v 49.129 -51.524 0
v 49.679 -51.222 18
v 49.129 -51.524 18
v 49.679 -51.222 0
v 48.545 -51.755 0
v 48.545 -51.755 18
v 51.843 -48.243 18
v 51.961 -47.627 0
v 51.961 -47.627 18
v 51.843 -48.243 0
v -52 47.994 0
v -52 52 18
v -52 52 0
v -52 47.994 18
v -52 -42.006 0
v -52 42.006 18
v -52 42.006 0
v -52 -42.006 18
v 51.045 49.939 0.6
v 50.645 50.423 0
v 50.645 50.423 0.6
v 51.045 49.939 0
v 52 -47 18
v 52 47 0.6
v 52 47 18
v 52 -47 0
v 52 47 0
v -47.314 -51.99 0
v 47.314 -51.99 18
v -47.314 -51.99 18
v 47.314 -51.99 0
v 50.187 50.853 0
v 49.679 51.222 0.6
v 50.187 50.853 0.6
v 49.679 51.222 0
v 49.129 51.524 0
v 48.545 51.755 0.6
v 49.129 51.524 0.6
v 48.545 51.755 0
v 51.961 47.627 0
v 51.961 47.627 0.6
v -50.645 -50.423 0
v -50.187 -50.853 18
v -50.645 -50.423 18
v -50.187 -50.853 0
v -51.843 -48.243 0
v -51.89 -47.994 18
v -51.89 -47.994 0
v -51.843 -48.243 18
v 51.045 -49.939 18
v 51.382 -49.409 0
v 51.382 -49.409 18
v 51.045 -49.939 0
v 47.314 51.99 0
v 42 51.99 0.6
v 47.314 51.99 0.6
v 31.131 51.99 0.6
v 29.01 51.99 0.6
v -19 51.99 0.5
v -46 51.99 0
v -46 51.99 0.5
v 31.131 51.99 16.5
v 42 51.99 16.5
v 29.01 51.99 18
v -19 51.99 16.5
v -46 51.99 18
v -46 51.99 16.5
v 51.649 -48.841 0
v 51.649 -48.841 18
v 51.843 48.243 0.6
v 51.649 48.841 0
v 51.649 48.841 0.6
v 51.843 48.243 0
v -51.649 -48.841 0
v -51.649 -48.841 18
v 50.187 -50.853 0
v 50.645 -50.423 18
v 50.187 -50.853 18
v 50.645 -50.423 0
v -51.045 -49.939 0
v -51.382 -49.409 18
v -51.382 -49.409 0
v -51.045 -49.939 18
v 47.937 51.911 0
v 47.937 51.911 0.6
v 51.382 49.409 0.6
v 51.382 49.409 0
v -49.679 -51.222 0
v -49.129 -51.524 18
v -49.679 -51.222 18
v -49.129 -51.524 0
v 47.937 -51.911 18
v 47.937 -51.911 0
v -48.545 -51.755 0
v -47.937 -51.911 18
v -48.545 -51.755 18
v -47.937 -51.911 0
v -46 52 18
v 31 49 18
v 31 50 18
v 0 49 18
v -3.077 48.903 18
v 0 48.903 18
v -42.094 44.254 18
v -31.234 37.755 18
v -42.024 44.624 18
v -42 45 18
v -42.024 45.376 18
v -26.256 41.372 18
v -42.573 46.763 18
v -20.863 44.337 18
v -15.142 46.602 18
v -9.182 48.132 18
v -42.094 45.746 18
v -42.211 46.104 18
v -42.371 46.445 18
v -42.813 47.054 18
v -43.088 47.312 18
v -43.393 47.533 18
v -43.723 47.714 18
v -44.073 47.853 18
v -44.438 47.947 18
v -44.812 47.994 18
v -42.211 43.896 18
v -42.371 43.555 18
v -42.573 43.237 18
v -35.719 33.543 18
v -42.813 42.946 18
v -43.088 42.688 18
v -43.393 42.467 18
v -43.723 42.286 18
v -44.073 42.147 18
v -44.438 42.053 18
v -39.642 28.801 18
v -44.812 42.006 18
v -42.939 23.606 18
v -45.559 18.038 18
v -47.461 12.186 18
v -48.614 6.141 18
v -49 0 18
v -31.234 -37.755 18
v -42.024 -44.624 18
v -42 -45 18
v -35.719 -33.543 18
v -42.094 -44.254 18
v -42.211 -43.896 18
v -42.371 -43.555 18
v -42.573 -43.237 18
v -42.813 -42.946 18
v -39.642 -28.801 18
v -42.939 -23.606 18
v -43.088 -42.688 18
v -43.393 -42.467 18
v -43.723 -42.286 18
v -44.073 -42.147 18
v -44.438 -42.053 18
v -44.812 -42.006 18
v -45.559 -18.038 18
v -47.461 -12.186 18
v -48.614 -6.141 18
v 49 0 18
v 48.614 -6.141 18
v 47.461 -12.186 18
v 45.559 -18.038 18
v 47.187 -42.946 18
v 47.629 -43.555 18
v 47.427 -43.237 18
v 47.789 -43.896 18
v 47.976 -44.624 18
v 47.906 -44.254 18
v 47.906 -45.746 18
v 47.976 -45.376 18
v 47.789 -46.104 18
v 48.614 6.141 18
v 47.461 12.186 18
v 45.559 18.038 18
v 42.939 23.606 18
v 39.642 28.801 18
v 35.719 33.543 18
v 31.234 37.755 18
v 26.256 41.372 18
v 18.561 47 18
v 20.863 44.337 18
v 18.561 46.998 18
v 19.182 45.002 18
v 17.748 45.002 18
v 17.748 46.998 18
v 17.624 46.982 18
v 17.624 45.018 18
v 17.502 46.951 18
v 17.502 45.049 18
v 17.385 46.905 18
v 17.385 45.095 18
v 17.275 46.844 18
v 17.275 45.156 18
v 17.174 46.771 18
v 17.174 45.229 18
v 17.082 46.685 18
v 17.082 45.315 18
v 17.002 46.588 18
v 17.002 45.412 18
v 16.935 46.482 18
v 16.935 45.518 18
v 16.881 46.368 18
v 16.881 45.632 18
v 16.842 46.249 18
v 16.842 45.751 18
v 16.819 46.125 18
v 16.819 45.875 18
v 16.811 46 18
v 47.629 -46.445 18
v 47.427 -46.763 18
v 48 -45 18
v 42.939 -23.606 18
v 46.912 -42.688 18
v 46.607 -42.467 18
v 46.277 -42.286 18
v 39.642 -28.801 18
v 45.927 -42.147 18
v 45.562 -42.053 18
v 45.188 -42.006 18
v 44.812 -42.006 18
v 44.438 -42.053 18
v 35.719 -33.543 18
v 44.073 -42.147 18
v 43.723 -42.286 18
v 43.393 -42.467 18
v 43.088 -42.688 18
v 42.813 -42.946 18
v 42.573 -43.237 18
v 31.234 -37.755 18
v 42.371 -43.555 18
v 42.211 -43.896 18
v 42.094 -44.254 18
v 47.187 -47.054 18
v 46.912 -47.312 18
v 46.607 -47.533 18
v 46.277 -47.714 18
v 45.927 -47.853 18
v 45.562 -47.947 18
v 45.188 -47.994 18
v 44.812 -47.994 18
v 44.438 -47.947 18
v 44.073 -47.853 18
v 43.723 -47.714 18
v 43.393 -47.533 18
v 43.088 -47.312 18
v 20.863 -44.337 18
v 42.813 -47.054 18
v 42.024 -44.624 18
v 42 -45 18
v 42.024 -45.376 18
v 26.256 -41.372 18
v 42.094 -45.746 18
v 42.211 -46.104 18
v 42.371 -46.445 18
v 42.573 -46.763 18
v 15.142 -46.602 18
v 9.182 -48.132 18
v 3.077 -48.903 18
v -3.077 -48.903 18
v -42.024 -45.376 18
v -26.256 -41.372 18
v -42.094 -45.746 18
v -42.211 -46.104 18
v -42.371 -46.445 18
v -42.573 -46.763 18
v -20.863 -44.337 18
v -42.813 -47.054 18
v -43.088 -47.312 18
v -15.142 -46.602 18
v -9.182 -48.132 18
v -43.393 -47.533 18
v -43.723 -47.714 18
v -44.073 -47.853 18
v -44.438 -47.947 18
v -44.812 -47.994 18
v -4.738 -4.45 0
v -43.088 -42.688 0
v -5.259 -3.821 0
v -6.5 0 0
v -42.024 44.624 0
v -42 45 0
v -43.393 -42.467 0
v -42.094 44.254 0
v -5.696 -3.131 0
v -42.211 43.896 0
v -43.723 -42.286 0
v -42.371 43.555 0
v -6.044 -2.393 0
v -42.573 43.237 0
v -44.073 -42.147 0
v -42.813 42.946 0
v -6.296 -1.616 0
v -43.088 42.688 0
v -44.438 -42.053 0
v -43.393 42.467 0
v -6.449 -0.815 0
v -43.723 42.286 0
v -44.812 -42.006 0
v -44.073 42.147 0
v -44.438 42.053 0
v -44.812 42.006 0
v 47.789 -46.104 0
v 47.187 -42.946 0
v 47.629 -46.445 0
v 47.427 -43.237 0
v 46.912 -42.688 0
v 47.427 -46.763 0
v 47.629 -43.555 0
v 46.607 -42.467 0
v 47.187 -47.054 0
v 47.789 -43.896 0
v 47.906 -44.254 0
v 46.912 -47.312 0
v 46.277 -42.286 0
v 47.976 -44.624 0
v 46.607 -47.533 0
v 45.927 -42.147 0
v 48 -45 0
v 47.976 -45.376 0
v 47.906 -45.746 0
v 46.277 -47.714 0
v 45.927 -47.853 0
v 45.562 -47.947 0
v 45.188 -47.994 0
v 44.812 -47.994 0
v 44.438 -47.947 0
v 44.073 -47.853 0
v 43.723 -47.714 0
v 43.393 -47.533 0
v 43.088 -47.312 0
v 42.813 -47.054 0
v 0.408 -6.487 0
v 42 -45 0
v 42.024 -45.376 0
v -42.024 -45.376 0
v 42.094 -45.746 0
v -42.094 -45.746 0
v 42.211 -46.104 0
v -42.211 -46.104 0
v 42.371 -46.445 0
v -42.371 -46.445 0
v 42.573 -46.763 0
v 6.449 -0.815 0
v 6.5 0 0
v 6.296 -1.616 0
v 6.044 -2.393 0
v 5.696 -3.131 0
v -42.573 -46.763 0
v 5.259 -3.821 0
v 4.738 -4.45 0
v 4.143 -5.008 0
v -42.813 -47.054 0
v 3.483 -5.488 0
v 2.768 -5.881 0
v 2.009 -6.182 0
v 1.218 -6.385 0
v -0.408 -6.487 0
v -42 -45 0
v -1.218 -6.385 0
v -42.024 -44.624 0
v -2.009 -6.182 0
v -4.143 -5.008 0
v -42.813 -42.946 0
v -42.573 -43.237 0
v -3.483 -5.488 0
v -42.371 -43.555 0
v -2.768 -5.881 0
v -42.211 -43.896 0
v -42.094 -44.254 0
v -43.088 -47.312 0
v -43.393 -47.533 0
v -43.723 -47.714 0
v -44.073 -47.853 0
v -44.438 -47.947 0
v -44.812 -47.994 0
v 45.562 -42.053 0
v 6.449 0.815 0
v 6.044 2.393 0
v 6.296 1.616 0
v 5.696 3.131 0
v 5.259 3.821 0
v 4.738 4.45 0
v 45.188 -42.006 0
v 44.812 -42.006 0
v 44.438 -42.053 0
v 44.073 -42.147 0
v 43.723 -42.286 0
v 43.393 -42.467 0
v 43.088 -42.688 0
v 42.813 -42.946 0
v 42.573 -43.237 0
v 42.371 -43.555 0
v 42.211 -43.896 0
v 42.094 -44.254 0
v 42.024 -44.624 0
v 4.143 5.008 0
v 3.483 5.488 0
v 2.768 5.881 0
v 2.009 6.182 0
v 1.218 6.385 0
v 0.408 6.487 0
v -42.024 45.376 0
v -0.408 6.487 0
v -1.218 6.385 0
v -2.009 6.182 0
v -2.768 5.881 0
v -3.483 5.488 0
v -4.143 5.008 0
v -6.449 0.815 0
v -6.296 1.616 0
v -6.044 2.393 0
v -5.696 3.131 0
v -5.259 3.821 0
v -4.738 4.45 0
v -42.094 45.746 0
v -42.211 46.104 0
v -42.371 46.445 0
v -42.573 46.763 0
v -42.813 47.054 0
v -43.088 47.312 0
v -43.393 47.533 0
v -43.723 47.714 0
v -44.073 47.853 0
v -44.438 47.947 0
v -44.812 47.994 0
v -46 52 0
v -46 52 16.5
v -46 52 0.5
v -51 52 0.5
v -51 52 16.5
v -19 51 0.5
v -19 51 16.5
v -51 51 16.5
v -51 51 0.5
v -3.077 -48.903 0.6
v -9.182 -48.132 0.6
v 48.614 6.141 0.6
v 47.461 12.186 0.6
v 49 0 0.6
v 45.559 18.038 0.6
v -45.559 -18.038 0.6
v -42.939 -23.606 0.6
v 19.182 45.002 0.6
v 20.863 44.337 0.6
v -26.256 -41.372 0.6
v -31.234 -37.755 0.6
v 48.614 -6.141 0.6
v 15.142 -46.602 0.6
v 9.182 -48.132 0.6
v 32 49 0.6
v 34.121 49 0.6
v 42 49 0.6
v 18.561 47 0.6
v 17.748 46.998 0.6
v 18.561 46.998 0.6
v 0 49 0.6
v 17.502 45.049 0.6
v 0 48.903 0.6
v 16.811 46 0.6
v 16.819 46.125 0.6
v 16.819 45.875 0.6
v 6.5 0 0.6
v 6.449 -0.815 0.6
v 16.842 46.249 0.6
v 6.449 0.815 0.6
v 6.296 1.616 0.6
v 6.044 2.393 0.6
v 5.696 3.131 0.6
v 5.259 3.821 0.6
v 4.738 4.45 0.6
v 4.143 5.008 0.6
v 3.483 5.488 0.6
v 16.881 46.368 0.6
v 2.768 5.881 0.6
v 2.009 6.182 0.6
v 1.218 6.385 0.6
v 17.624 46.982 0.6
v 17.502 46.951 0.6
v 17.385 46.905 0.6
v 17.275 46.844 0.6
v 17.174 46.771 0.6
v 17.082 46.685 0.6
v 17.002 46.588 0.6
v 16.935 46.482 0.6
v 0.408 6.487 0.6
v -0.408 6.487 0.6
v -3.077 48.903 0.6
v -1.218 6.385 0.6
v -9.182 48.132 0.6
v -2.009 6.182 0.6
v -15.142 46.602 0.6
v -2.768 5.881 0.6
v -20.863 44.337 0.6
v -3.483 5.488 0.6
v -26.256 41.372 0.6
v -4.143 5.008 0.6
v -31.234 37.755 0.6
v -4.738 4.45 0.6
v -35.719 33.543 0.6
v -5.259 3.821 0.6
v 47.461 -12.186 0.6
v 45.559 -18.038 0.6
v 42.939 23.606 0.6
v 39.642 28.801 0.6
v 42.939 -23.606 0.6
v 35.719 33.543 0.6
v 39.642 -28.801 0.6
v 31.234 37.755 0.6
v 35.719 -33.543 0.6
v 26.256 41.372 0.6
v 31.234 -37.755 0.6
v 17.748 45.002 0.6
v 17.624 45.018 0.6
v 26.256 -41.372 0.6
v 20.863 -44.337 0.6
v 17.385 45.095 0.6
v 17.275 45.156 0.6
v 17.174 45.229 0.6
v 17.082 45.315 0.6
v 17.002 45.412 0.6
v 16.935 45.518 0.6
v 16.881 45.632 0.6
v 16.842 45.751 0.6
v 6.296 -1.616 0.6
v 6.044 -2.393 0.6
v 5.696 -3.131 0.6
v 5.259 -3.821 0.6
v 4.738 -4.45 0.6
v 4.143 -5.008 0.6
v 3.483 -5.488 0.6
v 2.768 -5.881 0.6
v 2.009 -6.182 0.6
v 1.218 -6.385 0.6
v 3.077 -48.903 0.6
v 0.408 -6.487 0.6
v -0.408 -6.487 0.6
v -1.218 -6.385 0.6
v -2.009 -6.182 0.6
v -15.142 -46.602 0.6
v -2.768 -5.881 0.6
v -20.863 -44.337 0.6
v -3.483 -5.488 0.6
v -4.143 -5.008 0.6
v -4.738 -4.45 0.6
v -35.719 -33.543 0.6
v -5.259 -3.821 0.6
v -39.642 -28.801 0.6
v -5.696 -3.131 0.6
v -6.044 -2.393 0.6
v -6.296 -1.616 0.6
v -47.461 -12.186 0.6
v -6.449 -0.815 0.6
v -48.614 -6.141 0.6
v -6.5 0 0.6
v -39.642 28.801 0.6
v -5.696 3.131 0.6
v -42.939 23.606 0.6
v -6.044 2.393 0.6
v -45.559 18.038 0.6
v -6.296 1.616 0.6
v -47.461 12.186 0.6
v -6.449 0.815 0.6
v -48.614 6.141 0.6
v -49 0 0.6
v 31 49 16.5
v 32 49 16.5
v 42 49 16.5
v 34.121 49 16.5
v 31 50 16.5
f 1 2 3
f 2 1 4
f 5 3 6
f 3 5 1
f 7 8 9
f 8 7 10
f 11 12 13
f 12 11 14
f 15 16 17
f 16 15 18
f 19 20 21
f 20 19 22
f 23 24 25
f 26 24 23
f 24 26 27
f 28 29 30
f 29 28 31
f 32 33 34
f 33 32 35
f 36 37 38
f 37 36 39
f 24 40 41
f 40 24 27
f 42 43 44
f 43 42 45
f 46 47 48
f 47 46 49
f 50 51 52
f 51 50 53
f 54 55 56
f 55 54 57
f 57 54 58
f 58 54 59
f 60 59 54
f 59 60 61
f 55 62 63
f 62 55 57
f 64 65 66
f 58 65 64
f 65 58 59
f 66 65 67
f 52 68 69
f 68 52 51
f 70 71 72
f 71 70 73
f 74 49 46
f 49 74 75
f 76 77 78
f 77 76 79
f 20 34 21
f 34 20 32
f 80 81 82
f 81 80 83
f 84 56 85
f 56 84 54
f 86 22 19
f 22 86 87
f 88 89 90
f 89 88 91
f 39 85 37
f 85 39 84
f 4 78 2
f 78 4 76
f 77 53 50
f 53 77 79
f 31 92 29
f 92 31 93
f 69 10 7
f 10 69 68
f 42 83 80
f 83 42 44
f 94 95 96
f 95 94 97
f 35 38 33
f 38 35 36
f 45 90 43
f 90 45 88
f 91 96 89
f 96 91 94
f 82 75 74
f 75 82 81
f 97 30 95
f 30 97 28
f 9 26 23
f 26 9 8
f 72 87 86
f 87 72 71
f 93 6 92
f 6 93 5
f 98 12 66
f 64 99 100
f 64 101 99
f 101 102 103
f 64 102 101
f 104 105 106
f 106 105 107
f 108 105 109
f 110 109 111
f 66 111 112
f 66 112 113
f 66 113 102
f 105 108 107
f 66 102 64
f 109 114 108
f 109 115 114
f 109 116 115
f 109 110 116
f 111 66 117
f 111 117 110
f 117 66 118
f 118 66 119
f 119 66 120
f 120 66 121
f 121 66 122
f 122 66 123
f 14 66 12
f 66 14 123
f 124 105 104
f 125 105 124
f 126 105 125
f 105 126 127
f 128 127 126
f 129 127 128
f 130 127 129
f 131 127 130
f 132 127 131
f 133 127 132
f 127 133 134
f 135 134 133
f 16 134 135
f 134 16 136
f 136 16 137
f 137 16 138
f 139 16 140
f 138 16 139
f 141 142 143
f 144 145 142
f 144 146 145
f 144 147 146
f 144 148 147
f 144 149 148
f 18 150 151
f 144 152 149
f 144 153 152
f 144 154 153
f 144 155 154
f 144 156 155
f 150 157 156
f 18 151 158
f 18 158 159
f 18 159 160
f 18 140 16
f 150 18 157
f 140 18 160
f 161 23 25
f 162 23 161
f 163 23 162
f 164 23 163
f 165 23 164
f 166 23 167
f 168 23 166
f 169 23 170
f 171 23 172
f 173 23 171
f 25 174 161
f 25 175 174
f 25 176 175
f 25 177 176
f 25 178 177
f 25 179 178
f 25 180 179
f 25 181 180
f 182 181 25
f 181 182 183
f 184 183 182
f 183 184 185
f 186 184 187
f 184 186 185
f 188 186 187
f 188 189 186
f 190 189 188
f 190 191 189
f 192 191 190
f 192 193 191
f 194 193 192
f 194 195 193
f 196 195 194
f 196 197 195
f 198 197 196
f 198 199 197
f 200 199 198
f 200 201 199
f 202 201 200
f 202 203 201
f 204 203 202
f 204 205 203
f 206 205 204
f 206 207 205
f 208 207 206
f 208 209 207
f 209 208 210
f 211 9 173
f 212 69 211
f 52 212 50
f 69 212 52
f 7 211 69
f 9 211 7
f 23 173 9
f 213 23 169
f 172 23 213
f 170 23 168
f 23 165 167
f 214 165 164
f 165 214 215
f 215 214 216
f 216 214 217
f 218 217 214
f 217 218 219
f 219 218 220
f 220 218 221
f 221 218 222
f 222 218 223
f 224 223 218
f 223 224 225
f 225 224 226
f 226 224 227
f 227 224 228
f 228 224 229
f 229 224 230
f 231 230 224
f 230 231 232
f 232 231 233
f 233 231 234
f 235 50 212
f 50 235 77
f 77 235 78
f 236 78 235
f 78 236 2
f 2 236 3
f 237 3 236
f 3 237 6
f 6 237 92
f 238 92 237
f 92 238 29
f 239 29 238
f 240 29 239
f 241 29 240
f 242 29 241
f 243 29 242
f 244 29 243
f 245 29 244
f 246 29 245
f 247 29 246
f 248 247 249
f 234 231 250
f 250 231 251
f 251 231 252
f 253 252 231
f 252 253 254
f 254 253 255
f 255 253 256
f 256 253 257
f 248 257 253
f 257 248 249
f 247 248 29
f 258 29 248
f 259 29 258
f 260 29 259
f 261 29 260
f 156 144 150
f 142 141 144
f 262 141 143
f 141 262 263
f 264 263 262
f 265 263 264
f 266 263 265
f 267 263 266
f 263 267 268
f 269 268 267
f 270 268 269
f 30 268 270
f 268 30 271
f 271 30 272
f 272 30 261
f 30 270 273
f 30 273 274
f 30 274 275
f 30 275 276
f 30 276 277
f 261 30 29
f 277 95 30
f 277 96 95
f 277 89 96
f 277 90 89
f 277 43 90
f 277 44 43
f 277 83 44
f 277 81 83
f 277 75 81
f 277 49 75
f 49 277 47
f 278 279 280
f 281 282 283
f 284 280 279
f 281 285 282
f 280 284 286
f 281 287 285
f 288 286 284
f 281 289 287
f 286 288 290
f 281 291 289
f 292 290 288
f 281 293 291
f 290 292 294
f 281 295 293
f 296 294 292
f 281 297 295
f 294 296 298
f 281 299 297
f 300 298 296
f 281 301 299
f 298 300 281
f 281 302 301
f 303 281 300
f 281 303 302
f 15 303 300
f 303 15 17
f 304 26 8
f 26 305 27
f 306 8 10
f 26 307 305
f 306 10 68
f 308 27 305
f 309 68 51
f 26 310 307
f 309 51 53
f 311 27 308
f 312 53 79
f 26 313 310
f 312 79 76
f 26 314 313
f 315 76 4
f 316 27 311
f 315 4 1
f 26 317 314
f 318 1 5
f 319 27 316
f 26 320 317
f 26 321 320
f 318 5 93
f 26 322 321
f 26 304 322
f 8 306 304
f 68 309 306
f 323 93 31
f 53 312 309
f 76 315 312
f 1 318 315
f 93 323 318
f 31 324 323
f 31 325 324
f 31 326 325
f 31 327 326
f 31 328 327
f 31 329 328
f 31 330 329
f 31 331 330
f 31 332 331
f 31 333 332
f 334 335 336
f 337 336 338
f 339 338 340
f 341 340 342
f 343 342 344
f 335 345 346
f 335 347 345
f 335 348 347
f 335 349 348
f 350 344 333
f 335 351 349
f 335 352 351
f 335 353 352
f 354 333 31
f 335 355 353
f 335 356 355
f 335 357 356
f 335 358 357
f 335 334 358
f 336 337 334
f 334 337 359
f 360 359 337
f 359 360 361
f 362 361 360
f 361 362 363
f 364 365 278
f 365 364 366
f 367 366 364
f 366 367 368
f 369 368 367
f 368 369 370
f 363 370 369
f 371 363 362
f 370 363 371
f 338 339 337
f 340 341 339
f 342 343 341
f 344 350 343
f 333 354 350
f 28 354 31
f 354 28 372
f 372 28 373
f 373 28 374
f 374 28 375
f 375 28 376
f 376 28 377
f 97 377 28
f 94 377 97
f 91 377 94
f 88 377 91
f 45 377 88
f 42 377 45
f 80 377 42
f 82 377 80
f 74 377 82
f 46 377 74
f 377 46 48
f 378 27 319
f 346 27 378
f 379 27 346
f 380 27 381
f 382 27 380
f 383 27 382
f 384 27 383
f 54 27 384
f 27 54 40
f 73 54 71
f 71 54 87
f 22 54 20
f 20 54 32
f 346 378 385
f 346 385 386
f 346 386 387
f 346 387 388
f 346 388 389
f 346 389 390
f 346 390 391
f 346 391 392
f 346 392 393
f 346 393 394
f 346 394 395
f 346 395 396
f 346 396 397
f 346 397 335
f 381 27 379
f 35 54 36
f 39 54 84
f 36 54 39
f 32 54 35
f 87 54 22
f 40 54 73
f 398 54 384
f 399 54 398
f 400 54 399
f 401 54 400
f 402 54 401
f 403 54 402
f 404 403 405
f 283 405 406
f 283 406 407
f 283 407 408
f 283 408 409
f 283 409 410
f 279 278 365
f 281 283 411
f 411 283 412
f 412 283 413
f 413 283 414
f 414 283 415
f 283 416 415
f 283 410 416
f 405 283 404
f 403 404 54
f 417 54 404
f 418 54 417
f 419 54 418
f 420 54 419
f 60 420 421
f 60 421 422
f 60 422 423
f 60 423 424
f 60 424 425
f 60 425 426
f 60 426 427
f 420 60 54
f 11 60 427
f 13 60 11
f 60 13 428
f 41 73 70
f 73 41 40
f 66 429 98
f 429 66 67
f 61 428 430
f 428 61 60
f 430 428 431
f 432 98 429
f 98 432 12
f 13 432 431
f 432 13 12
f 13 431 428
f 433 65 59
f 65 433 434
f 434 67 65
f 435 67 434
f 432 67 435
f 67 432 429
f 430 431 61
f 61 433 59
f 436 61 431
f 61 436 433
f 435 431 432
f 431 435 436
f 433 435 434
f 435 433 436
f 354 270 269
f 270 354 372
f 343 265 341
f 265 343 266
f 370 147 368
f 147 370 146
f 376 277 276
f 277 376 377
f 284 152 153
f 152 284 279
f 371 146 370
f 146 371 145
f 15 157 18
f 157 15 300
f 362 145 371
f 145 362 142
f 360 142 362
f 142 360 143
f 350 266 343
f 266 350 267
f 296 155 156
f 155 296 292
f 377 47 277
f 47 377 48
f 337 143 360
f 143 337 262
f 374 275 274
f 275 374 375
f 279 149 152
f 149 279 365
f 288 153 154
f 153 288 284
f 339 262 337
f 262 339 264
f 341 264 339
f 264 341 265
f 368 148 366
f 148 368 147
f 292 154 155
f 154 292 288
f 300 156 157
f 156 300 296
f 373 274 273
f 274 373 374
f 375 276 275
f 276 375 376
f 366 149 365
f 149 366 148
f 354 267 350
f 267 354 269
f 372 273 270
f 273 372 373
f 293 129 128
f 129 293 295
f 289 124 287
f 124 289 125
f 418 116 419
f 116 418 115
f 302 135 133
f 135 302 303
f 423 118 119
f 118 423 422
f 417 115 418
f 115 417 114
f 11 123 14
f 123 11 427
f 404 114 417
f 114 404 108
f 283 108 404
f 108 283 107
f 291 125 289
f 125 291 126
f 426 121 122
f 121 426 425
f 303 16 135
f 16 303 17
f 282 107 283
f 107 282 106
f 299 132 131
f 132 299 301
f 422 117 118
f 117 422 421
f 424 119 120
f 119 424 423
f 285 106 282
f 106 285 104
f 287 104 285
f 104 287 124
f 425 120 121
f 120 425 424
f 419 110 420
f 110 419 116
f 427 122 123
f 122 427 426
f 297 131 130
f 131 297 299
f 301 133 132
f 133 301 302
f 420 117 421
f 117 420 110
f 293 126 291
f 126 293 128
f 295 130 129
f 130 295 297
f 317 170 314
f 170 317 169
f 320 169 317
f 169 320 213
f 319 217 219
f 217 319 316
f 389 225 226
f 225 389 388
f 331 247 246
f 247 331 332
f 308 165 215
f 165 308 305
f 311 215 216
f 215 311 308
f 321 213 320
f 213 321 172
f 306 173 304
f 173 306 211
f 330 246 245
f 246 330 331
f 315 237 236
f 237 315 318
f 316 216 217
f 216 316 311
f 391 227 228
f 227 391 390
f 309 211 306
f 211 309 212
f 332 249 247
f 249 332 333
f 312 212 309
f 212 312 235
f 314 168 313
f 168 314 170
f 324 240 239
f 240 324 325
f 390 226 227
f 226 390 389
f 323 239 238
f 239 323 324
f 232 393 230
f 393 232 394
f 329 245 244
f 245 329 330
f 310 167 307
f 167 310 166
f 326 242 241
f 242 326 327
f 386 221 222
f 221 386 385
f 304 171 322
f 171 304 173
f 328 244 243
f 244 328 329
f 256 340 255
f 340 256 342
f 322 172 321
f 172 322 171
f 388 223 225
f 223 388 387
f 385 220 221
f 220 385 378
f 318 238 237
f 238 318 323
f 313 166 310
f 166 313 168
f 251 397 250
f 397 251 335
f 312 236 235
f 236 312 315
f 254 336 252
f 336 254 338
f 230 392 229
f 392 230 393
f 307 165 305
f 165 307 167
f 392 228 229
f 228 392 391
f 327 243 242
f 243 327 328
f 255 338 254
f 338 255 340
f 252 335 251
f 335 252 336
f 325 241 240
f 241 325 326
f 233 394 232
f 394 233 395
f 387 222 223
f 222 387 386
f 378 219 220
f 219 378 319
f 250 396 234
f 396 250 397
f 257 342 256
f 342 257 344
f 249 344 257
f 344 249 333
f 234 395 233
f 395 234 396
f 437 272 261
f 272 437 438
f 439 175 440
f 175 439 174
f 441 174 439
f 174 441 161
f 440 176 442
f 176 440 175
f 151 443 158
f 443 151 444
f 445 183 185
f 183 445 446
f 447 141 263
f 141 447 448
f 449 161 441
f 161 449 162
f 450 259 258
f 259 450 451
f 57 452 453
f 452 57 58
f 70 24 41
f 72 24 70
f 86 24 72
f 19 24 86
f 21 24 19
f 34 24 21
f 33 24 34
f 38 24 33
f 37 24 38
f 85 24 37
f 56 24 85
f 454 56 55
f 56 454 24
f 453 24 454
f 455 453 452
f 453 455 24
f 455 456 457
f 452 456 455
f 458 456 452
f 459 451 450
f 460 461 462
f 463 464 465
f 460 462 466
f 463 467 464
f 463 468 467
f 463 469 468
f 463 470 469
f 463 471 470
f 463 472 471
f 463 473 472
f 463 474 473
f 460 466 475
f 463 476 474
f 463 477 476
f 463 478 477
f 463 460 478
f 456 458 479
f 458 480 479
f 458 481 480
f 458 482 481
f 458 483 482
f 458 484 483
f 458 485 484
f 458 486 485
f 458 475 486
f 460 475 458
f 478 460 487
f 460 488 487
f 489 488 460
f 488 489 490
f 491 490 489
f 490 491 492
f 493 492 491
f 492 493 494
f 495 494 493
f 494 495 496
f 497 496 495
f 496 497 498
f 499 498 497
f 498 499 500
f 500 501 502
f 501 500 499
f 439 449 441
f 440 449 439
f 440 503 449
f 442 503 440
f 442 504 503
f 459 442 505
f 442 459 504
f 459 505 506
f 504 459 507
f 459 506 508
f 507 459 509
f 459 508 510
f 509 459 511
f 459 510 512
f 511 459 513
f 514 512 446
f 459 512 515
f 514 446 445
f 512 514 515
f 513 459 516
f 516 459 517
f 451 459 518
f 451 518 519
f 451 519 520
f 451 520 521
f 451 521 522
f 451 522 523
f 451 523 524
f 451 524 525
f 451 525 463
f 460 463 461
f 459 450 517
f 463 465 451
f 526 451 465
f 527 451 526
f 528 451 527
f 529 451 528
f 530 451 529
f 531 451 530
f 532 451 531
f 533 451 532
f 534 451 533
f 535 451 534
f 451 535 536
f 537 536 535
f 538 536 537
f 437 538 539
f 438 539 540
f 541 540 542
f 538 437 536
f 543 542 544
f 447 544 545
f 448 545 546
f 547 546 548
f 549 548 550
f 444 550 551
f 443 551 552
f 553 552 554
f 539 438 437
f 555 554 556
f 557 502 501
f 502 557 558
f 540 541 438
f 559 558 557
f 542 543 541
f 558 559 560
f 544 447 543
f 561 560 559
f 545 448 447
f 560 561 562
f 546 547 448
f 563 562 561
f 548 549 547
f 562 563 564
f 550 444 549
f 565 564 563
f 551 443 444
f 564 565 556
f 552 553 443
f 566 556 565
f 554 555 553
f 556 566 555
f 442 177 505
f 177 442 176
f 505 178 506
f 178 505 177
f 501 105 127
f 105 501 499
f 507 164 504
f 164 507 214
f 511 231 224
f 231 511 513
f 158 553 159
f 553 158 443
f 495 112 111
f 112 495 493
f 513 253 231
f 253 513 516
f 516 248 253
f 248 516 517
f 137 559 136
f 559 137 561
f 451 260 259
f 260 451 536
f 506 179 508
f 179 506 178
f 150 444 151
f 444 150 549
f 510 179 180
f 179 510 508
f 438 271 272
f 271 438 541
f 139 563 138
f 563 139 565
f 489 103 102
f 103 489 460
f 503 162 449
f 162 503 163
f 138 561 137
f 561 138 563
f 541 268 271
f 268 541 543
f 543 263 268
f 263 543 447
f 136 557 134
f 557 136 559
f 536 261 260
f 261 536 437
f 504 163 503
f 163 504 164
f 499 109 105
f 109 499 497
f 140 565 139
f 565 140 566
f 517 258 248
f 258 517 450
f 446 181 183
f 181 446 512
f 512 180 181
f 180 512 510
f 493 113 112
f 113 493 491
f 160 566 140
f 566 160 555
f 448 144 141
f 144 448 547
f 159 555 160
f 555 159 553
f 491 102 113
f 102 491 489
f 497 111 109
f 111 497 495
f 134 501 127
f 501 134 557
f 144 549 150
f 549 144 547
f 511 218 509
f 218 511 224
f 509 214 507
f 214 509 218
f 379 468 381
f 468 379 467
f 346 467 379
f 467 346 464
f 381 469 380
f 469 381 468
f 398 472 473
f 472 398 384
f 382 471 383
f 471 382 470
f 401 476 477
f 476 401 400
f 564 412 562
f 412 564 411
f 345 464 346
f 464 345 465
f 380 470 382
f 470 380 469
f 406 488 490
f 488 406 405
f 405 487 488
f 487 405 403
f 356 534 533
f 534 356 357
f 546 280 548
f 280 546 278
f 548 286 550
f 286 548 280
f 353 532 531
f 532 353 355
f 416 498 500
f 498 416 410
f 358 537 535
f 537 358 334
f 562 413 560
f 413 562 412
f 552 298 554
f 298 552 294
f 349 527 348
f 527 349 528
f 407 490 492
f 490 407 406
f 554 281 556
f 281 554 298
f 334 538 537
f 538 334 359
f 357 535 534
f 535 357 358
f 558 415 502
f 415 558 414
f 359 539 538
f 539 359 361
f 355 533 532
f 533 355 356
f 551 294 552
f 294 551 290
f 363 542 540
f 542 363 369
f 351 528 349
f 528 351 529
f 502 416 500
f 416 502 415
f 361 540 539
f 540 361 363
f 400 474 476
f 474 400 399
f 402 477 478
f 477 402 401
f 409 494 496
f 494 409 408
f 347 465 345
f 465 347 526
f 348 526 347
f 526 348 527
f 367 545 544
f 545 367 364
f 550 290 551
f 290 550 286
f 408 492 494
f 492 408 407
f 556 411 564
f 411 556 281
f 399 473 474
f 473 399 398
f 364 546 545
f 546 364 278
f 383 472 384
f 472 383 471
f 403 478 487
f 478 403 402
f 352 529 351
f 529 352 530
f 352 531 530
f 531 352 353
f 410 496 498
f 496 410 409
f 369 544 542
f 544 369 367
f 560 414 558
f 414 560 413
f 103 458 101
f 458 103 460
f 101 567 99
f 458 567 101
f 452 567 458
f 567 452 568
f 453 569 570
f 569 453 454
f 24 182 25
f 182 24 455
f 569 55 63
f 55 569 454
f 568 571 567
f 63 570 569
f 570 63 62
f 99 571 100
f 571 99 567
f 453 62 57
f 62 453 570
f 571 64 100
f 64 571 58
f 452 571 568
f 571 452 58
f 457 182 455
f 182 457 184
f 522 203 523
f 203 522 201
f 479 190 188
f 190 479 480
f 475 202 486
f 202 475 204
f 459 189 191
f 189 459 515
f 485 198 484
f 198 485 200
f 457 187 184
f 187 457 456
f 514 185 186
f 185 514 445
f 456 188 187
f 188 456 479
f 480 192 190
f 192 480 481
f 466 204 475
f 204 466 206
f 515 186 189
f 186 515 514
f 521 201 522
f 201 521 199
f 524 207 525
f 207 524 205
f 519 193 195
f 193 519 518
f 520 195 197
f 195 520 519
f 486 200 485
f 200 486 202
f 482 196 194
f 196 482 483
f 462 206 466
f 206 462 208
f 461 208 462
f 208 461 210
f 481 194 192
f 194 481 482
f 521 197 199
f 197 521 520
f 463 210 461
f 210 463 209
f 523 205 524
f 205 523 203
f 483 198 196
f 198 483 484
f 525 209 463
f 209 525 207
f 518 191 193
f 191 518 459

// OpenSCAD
$fn = 50;


union() {
	difference() {
		union() {
			translate(v = [0, 0, 0]) {
				rotate(a = [0, 0, 0]) {
					hull() {
						translate(v = [-47.0000000000, 47.0000000000, 0]) {
							rotate(a = [0, 0, 0]) {
								translate(v = [0, 0, 0]) {
									rotate(a = [0, 0, 0]) {
										cylinder(h = 18, r = 5);
									}
								}
							}
						}
						translate(v = [47.0000000000, 47.0000000000, 0]) {
							rotate(a = [0, 0, 0]) {
								translate(v = [0, 0, 0]) {
									rotate(a = [0, 0, 0]) {
										cylinder(h = 18, r = 5);
									}
								}
							}
						}
						translate(v = [-47.0000000000, -47.0000000000, 0]) {
							rotate(a = [0, 0, 0]) {
								translate(v = [0, 0, 0]) {
									rotate(a = [0, 0, 0]) {
										cylinder(h = 18, r = 5);
									}
								}
							}
						}
						translate(v = [47.0000000000, -47.0000000000, 0]) {
							rotate(a = [0, 0, 0]) {
								translate(v = [0, 0, 0]) {
									rotate(a = [0, 0, 0]) {
										cylinder(h = 18, r = 5);
									}
								}
							}
						}
					}
				}
			}
			translate(v = [-52.0000000000, 46.0000000000, 0]) {
				rotate(a = [0, 0, 0]) {
					cube(size = [6, 6, 18]);
				}
			}
		}
		union() {
			#translate(v = [-51.0000000000, 51.0000000000, 0.5000000000]) {
				rotate(a = [0, 0, 0]) {
					cube(size = [32, 1, 16]);
				}
			}
			translate(v = [-52.5000000000, -45.0000000000, -125]) {
				rotate(a = [0, 0, 0]) {
					hull() {
						translate(v = [7.5000000000, 0, 0]) {
							rotate(a = [0, 0, 0]) {
								translate(v = [0, 0, 0]) {
									rotate(a = [0, 0, 0]) {
										cylinder(h = 250, r = 3.0000000000);
									}
								}
							}
						}
						translate(v = [-7.5000000000, 0, 0]) {
							rotate(a = [0, 0, 0]) {
								translate(v = [0, 0, 0]) {
									rotate(a = [0, 0, 0]) {
										cylinder(h = 250, r = 3.0000000000);
									}
								}
							}
						}
					}
				}
			}
			translate(v = [-52.5000000000, 45.0000000000, -125]) {
				rotate(a = [0, 0, 0]) {
					hull() {
						translate(v = [7.5000000000, 0, 0]) {
							rotate(a = [0, 0, 0]) {
								translate(v = [0, 0, 0]) {
									rotate(a = [0, 0, 0]) {
										cylinder(h = 250, r = 3.0000000000);
									}
								}
							}
						}
						translate(v = [-7.5000000000, 0, 0]) {
							rotate(a = [0, 0, 0]) {
								translate(v = [0, 0, 0]) {
									rotate(a = [0, 0, 0]) {
										cylinder(h = 250, r = 3.0000000000);
									}
								}
							}
						}
					}
				}
			}
			translate(v = [45.0000000000, -45.0000000000, -125.0000000000]) {
				rotate(a = [0, 0, 0]) {
					cylinder(h = 250, r = 3.0000000000);
				}
			}
			translate(v = [0, 0, 0.6000000000]) {
				rotate(a = [0, 0, 0]) {
					cylinder(h = 20.4000000000, r = 49.0000000000);
				}
			}
			translate(v = [0, 0, -9.0000000000]) {
				rotate(a = [0, 0, 0]) {
					cylinder(h = 18, r = 6.5000000000);
				}
			}
			translate(v = [0.0000000000, 47.0000000000, 0.6000000000]) {
				rotate(a = [0, 0, 0]) {
					cube(size = [52.0000000000, 2, 20.4000000000]);
				}
			}
			translate(v = [42.0000000000, 47.0000000000, 0.6000000000]) {
				rotate(a = [0, 0, 0]) {
					cube(size = [10, 5, 20.4000000000]);
				}
			}
			translate(v = [31.0000000000, 47.0000000000, 16.5000000000]) {
				rotate(a = [0, 0, 0]) {
					cube(size = [21, 5, 1.5000000000]);
				}
			}
			translate(v = [28.2500000000, 52.7500000000, 0.6000000000]) {
				rotate(a = [0, 0, -45]) {
					cube(size = [7.5000000000, 1.5000000000, 20.4000000000]);
				}
			}
			translate(v = [11.0610000000, 45.0000000000, 0.6000000000]) {
				rotate(a = [0, 0, 0]) {
					cube(size = [7.5000000000, 2, 17.4000000000]);
				}
			}
		}
	}
	union() {
		translate(v = [20.3110000000, 46.0000000000, 0]) {
			rotate(a = [0, 0, 0]) {
				hull() {
					translate(v = [2.5000000000, 0, 0]) {
						rotate(a = [0, 0, 0]) {
							#translate(v = [0, 0, 0]) {
								rotate(a = [0, 0, 0]) {
									cylinder(h = 18, r = 1.0000000000);
								}
							}
						}
					}
					translate(v = [-2.5000000000, 0, 0]) {
						rotate(a = [0, 0, 0]) {
							#translate(v = [0, 0, 0]) {
								rotate(a = [0, 0, 0]) {
									cylinder(h = 18, r = 1.0000000000);
								}
							}
						}
					}
				}
			}
		}
	}
}
